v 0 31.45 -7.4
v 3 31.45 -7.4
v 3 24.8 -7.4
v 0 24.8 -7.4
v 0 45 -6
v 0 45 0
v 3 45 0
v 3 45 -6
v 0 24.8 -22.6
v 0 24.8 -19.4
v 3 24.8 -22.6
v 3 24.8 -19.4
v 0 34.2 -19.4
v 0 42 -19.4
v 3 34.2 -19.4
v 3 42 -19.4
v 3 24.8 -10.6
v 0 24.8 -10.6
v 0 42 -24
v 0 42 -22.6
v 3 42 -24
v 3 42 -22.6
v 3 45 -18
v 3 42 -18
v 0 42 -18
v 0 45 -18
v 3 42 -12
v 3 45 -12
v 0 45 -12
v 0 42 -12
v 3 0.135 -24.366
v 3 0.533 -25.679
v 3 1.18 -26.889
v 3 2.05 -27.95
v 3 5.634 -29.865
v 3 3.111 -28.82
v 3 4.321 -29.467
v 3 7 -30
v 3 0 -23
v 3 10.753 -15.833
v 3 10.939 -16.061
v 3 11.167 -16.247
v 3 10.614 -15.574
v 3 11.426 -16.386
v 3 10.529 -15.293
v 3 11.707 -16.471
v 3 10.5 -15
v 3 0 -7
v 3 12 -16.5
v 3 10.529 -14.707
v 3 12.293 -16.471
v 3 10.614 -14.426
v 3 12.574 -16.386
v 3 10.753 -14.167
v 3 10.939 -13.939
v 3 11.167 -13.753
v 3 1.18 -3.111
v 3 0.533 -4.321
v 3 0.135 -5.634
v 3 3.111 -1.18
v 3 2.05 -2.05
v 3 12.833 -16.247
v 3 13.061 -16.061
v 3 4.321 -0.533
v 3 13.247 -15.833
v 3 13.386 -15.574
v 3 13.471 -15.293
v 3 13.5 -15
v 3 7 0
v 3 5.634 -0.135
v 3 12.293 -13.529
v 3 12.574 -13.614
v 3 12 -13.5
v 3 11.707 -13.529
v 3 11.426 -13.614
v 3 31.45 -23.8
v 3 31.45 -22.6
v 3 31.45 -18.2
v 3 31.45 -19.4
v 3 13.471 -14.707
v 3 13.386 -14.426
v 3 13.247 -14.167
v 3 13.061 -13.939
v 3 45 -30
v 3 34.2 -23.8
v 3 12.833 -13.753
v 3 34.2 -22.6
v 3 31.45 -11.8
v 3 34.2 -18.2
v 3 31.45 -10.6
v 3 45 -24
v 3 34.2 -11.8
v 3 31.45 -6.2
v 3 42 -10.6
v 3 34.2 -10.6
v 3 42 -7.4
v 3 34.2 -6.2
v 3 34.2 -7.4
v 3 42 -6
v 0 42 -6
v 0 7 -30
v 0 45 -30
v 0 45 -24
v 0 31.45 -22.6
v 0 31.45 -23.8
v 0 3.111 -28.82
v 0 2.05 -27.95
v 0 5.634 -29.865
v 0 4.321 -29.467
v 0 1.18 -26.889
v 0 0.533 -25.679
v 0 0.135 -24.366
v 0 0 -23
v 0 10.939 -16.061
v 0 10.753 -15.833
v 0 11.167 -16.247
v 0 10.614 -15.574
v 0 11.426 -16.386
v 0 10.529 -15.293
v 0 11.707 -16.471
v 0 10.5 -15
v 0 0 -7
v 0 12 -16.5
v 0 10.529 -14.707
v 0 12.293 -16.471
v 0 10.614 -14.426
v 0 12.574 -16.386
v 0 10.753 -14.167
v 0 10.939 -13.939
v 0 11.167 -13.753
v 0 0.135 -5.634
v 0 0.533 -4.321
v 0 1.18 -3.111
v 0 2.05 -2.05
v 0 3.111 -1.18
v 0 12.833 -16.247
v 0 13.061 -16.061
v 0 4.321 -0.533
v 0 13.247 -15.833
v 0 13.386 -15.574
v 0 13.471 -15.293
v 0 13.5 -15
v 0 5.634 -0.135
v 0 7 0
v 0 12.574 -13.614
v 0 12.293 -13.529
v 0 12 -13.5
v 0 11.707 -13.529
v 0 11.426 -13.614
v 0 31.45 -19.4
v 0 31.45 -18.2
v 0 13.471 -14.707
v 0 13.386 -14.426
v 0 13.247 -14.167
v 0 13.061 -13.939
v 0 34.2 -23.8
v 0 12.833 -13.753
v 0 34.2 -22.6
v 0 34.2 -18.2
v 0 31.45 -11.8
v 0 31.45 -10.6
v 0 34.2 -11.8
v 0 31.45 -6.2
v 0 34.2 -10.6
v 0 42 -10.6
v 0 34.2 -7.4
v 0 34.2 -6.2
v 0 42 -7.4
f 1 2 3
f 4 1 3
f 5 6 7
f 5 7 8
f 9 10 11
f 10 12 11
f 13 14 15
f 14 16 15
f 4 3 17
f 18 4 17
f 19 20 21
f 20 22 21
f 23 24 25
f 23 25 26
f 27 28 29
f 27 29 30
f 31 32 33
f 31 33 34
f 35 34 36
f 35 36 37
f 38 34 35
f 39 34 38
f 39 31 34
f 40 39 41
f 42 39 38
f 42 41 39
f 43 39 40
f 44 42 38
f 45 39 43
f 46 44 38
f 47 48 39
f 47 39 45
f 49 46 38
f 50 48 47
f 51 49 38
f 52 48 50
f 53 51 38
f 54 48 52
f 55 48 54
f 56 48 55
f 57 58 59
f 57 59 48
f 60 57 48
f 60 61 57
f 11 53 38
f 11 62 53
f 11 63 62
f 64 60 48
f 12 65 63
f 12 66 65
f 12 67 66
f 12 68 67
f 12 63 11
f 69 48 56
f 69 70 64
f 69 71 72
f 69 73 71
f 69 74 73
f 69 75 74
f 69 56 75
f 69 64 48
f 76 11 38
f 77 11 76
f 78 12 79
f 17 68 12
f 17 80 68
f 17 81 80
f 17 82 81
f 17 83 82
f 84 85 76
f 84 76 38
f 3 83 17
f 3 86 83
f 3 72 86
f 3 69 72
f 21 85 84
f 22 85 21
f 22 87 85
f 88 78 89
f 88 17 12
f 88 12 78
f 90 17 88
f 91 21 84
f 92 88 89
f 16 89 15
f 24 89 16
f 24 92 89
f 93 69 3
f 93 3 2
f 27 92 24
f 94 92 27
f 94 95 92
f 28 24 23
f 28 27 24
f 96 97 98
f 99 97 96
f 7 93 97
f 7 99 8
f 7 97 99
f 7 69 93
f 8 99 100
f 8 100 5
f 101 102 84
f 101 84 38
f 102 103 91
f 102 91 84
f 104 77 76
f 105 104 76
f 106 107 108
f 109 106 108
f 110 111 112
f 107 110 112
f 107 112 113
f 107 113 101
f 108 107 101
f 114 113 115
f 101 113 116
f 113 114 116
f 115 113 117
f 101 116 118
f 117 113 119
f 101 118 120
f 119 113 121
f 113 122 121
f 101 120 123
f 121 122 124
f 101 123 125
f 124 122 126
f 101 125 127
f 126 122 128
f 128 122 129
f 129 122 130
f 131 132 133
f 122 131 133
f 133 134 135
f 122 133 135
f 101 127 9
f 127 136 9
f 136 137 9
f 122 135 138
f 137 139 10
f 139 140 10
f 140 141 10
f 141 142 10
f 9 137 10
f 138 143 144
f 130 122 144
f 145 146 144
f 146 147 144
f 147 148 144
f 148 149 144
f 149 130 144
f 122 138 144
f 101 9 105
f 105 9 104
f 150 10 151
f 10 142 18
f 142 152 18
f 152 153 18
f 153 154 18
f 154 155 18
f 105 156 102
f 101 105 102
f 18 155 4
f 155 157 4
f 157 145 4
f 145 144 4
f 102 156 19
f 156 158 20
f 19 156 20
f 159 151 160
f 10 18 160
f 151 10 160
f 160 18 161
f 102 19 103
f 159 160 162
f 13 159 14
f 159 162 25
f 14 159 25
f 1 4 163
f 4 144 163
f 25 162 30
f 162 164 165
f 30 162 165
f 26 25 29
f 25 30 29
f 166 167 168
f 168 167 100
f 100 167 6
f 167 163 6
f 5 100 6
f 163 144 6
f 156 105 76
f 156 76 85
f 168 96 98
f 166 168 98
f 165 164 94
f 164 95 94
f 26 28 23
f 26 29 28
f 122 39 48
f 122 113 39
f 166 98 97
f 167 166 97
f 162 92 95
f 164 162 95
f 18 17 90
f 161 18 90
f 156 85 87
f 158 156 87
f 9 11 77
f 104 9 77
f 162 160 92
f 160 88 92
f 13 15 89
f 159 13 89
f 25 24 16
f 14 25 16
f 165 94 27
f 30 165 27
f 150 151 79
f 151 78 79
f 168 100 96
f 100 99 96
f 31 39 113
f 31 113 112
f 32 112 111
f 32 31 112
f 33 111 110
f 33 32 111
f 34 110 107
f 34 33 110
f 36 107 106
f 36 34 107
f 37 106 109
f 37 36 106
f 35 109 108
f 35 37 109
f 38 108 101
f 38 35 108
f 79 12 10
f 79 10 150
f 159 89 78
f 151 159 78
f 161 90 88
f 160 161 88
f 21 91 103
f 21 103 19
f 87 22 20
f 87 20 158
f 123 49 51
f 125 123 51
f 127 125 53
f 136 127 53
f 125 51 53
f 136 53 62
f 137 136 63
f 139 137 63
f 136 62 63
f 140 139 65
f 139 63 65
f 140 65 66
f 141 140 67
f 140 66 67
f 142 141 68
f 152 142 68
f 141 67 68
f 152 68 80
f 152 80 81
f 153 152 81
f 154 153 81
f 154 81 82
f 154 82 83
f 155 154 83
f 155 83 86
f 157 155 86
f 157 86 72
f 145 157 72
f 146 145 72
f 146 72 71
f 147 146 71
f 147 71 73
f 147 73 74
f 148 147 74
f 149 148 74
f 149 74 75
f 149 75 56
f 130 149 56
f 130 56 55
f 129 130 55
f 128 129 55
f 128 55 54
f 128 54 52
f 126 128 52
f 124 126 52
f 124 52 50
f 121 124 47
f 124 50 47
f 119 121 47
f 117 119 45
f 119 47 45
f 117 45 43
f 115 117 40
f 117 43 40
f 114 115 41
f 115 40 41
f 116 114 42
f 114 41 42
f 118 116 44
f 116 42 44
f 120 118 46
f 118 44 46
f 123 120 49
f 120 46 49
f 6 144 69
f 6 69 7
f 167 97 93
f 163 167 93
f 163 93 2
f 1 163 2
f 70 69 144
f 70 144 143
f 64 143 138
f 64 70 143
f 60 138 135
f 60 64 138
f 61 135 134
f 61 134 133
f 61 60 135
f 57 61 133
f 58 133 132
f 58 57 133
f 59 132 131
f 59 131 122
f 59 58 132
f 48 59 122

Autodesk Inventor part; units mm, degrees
ref_plane "YZ Plane" through (0, 0, 0) normal (1, 0, 0) x (0, 1, 0)
ref_plane "XZ Plane" through (0, 0, 0) normal (0, 1, 0) x (-1, 0, 0)
ref_plane "XY Plane" through (0, 0, 0) normal (0, 0, 1) x (1, 0, 0)
sketch "Sketch1" plane through (0, 0, 0) normal (1, 0, 0) x (0, 1, 0)
  line L0 (0, 0) -> (45, 0)
  line L1 (45, 0) -> (45, -30)
  line L2 (45, -30) -> (0, -30)
  line L3 (0, -30) -> (0, 0)
  dimension "d0" = 45
  dimension "d1" = 30
extrude "Extrusion1" add sketch "Sketch1" along normal blind 3
sketch "Sketch2" plane through (3, 0, 0) normal (1, 0, 0) x (0, 0, -1)
  line L0 (30, 45) -> (0, 45) projected
  line L1 (6, 45) -> (12, 45)
  line L2 (12, 45) -> (12, 42)
  line L3 (6, 42) -> (6, 45)
  line L4 (0, 45) -> (0, 0) projected
  line L5 (18, 45) -> (24, 45)
  line L6 (24, 45) -> (24, 42)
  line L7 (18, 42) -> (18, 45)
  line L8 (30, 0) -> (30, 45) projected
  line L9 (6, 42) -> (7.4, 42)
  line L10 (7.4, 42) -> (7.4, 34.2)
  line L11 (7.4, 34.2) -> (6.2, 34.2)
  line L12 (6.2, 34.2) -> (6.2, 31.45)
  line L13 (6.2, 31.45) -> (7.4, 31.45)
  line L14 (7.4, 31.45) -> (7.4, 24.8)
  line L15 (7.4, 24.8) -> (10.6, 24.8)
  line L16 (10.6, 24.8) -> (10.6, 31.45)
  line L17 (10.6, 31.45) -> (11.8, 31.45)
  line L18 (11.8, 31.45) -> (11.8, 34.2)
  line L19 (11.8, 34.2) -> (10.6, 34.2)
  line L20 (10.6, 42) -> (12, 42)
  line L21 (10.6, 34.2) -> (10.6, 42)
  line L22 (18, 42) -> (19.4, 42)
  line L23 (19.4, 42) -> (19.4, 34.2)
  line L24 (19.4, 34.2) -> (18.2, 34.2)
  line L25 (18.2, 34.2) -> (18.2, 31.45)
  line L26 (18.2, 31.45) -> (19.4, 31.45)
  line L27 (19.4, 24.8) -> (19.4, 31.45)
  line L28 (19.4, 24.8) -> (22.6, 24.8)
  line L29 (22.6, 24.8) -> (22.6, 31.45)
  line L30 (22.6, 31.45) -> (23.8, 31.45)
  line L31 (23.8, 31.45) -> (23.8, 34.2)
  line L32 (23.8, 34.2) -> (22.6, 34.2)
  line L33 (22.6, 42) -> (24, 42)
  line L34 (22.6, 42) -> (22.6, 34.2)
  dimension "d4" = 6
  dimension "d6" = 6
  dimension "d18" = 6
  dimension "d19" = 3
  dimension "d20" = 6
  dimension "d21" = 6
  dimension "d22" = 1.4
  dimension "d23" = 7.8
  dimension "d24" = 1.2
  dimension "d25" = 2.75
  dimension "d26" = 1.2
  dimension "d27" = 6.65
  dimension "d28" = 3.2
  dimension "d29" = 1.2
  dimension "d30" = 1.4
  dimension "d31" = 1.2
  dimension "d32" = 3.2
  dimension "d33" = 1.2
  dimension "d34" = 20.2
extrude "Extrusion2" cut sketch "Sketch2" against normal blind 4
fillet "Fillet1" radius 7 2 edges at (1.5, 0, 0) (1.5, 0, -30)
sketch "Sketch3" plane through (3, 0, 0) normal (1, 0, 0) x (0, 0, -1)
  circle A0 centre (15, 12) radius 1.5
  line L0 (0, 45) -> (0, 7) projected
  line L1 (7, 0) -> (23, 0) projected
  point P0 (0, 0)
  dimension "d10" = 3
  dimension "d11" = 15
  dimension "d12" = 12
extrude "Extrusion3" cut sketch "Sketch3" against normal blind 4
properties part number "axel mount (3mm shaft)" material "Plywood, Finish"
